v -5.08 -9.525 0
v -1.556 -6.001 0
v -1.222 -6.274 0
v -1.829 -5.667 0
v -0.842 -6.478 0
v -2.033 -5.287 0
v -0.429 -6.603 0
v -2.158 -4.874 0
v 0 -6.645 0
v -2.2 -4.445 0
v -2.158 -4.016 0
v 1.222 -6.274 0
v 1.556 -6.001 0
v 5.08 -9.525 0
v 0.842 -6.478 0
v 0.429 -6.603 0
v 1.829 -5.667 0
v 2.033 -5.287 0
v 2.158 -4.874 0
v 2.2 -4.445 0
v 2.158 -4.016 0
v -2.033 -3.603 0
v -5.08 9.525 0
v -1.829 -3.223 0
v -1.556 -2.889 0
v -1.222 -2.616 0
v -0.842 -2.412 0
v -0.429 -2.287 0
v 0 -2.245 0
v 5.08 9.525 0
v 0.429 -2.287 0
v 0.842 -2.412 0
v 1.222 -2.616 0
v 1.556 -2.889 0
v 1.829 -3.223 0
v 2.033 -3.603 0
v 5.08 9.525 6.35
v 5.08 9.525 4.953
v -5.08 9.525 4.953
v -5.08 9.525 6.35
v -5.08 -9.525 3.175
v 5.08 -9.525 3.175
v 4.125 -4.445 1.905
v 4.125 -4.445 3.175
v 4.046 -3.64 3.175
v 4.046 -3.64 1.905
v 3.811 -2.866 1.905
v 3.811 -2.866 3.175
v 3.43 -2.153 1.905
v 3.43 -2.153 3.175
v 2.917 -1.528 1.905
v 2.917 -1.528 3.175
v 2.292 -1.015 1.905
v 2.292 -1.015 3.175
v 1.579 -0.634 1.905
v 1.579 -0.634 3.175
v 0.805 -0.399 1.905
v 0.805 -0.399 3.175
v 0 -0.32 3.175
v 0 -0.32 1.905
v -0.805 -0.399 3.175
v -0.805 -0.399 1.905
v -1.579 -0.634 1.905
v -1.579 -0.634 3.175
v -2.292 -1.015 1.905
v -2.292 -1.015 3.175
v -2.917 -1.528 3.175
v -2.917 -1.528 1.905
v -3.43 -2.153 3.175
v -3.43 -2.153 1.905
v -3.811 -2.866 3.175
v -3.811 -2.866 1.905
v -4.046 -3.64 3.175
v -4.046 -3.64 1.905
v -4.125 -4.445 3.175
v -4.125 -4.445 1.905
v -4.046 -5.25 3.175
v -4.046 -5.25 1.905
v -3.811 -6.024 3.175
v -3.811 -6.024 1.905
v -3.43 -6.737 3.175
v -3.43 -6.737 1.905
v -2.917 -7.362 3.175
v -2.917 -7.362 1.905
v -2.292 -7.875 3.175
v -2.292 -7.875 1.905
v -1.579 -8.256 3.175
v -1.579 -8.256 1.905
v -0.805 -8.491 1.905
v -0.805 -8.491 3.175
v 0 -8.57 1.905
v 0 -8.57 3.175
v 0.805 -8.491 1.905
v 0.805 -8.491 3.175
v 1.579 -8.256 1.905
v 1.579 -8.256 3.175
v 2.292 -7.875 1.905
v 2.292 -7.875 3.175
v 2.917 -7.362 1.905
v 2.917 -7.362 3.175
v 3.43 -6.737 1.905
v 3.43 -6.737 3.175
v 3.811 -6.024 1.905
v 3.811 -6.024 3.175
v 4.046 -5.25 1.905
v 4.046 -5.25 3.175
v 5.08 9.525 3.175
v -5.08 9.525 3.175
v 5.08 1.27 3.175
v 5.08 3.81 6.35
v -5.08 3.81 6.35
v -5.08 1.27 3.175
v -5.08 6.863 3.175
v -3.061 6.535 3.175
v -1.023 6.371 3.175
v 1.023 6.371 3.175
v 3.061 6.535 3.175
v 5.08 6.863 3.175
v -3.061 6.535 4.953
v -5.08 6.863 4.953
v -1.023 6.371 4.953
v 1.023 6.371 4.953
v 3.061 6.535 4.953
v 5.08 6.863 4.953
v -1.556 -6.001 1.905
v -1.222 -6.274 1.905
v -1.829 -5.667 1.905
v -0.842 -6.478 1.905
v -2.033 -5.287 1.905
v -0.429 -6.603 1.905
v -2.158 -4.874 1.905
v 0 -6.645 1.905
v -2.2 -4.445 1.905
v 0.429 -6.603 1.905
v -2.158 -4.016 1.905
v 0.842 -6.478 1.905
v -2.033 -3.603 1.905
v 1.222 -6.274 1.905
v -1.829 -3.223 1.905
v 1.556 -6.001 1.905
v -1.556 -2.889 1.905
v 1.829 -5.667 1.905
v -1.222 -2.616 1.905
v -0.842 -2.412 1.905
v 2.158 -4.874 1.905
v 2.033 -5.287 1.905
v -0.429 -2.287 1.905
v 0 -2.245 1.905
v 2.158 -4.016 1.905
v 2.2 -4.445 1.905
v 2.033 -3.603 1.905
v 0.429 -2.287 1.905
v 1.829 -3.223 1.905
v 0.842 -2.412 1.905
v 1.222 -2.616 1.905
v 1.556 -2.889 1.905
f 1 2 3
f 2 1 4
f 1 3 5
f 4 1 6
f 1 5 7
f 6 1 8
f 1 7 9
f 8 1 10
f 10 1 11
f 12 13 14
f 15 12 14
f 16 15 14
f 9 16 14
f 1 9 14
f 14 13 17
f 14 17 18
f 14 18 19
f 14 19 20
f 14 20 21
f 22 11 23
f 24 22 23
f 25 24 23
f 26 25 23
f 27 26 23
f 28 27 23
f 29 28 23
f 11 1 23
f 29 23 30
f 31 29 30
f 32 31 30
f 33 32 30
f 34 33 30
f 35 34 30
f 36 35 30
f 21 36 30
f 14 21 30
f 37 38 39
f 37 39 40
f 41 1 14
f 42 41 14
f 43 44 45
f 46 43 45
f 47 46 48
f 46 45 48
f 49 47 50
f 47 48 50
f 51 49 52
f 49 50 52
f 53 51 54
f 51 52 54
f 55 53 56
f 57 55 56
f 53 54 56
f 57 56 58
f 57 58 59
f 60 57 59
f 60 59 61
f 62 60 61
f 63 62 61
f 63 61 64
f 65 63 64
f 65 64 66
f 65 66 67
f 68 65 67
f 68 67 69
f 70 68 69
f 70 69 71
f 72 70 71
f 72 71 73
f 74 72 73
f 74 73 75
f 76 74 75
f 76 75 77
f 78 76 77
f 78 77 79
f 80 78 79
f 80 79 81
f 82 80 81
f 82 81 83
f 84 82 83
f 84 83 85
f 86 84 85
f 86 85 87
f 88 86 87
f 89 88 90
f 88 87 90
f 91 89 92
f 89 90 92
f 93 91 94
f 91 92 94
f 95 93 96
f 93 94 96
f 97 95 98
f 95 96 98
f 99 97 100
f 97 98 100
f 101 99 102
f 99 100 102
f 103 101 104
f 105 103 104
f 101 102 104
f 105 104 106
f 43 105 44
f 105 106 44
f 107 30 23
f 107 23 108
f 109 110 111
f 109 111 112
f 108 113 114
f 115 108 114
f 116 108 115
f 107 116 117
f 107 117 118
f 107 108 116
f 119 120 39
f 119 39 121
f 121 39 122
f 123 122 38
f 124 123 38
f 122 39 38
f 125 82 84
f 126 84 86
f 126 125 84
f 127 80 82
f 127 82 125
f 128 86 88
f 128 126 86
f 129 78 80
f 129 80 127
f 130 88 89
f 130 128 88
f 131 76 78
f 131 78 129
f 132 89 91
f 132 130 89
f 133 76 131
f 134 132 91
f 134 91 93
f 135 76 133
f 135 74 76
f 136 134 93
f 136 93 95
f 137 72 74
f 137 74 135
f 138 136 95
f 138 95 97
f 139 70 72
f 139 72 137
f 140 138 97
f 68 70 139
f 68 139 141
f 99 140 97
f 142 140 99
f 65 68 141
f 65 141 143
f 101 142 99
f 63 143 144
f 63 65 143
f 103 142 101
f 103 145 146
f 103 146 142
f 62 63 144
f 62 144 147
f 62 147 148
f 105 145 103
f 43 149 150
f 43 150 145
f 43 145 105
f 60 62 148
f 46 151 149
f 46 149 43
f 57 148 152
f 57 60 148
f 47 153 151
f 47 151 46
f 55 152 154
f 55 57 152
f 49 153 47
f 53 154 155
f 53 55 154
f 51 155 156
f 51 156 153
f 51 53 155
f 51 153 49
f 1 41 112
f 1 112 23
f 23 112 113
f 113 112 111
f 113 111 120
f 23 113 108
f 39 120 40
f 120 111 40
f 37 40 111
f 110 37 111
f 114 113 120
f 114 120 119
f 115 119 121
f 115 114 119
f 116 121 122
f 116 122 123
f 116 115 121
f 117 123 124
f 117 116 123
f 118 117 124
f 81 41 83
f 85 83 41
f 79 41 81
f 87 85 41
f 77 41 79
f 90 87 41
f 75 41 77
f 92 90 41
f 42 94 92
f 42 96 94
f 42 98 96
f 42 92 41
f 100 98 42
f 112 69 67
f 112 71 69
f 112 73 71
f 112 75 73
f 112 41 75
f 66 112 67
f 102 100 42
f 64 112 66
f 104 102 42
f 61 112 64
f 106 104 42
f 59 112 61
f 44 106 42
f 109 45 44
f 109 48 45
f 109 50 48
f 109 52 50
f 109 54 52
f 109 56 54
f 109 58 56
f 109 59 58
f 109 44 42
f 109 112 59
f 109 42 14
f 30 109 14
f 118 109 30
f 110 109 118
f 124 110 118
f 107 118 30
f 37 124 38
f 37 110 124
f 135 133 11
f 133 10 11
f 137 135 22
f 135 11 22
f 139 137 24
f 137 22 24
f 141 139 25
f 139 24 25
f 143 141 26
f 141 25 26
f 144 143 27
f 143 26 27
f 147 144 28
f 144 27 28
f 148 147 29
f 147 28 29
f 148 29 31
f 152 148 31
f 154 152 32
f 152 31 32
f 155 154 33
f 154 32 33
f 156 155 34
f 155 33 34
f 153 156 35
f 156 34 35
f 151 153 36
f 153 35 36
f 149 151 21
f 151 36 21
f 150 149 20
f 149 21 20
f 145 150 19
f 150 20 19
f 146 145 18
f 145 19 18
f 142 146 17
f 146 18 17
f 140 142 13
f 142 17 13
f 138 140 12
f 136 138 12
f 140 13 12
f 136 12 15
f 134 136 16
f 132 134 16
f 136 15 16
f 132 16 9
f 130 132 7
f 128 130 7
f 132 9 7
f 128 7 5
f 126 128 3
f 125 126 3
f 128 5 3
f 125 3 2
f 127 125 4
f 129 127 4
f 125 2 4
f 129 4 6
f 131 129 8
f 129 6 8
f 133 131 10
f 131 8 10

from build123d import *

# Parameters (mm, degrees)
F0_W           = 10.16
F0_H           = 19.05
F1_DEPTH       = 3.175
F4_DEPTH       = 10.16
F6_D           = 4.4
F6_DEPTH       = 12.7
F6_CBORE_D     = 8.25
F6_CBORE_DEPTH = 1.27
F7_R           = 25.4
F8_DEPTH       = 1.778


with BuildPart() as f1:
    # F0 (on Top) → F1 (new body)
    with BuildSketch(Plane.XY):
        Rectangle(F0_W, F0_H)
    extrude(amount=F1_DEPTH)

    # F2 (on face) → F4 (join, through all)
    with BuildSketch(Plane.YZ.offset(5.08)):
        Polygon((3.81, 6.35), (1.27, 3.175), (9.525, 3.175), (9.525, 6.35), align=None)
    extrude(amount=-F4_DEPTH)

    # F6
    with Locations(Plane.XY.offset(3.175)):
        with Locations((0, -4.445)):
            CounterBoreHole(F6_D / 2, F6_CBORE_D / 2, F6_CBORE_DEPTH, depth=F6_DEPTH)

    # F7 (on face) → F8 (cut)
    with BuildSketch(Plane.XY.offset(3.175)):
        with Locations((0, 31.75)):
            Circle(F7_R)
    extrude(amount=F8_DEPTH, mode=Mode.SUBTRACT)


solid = f1.part
